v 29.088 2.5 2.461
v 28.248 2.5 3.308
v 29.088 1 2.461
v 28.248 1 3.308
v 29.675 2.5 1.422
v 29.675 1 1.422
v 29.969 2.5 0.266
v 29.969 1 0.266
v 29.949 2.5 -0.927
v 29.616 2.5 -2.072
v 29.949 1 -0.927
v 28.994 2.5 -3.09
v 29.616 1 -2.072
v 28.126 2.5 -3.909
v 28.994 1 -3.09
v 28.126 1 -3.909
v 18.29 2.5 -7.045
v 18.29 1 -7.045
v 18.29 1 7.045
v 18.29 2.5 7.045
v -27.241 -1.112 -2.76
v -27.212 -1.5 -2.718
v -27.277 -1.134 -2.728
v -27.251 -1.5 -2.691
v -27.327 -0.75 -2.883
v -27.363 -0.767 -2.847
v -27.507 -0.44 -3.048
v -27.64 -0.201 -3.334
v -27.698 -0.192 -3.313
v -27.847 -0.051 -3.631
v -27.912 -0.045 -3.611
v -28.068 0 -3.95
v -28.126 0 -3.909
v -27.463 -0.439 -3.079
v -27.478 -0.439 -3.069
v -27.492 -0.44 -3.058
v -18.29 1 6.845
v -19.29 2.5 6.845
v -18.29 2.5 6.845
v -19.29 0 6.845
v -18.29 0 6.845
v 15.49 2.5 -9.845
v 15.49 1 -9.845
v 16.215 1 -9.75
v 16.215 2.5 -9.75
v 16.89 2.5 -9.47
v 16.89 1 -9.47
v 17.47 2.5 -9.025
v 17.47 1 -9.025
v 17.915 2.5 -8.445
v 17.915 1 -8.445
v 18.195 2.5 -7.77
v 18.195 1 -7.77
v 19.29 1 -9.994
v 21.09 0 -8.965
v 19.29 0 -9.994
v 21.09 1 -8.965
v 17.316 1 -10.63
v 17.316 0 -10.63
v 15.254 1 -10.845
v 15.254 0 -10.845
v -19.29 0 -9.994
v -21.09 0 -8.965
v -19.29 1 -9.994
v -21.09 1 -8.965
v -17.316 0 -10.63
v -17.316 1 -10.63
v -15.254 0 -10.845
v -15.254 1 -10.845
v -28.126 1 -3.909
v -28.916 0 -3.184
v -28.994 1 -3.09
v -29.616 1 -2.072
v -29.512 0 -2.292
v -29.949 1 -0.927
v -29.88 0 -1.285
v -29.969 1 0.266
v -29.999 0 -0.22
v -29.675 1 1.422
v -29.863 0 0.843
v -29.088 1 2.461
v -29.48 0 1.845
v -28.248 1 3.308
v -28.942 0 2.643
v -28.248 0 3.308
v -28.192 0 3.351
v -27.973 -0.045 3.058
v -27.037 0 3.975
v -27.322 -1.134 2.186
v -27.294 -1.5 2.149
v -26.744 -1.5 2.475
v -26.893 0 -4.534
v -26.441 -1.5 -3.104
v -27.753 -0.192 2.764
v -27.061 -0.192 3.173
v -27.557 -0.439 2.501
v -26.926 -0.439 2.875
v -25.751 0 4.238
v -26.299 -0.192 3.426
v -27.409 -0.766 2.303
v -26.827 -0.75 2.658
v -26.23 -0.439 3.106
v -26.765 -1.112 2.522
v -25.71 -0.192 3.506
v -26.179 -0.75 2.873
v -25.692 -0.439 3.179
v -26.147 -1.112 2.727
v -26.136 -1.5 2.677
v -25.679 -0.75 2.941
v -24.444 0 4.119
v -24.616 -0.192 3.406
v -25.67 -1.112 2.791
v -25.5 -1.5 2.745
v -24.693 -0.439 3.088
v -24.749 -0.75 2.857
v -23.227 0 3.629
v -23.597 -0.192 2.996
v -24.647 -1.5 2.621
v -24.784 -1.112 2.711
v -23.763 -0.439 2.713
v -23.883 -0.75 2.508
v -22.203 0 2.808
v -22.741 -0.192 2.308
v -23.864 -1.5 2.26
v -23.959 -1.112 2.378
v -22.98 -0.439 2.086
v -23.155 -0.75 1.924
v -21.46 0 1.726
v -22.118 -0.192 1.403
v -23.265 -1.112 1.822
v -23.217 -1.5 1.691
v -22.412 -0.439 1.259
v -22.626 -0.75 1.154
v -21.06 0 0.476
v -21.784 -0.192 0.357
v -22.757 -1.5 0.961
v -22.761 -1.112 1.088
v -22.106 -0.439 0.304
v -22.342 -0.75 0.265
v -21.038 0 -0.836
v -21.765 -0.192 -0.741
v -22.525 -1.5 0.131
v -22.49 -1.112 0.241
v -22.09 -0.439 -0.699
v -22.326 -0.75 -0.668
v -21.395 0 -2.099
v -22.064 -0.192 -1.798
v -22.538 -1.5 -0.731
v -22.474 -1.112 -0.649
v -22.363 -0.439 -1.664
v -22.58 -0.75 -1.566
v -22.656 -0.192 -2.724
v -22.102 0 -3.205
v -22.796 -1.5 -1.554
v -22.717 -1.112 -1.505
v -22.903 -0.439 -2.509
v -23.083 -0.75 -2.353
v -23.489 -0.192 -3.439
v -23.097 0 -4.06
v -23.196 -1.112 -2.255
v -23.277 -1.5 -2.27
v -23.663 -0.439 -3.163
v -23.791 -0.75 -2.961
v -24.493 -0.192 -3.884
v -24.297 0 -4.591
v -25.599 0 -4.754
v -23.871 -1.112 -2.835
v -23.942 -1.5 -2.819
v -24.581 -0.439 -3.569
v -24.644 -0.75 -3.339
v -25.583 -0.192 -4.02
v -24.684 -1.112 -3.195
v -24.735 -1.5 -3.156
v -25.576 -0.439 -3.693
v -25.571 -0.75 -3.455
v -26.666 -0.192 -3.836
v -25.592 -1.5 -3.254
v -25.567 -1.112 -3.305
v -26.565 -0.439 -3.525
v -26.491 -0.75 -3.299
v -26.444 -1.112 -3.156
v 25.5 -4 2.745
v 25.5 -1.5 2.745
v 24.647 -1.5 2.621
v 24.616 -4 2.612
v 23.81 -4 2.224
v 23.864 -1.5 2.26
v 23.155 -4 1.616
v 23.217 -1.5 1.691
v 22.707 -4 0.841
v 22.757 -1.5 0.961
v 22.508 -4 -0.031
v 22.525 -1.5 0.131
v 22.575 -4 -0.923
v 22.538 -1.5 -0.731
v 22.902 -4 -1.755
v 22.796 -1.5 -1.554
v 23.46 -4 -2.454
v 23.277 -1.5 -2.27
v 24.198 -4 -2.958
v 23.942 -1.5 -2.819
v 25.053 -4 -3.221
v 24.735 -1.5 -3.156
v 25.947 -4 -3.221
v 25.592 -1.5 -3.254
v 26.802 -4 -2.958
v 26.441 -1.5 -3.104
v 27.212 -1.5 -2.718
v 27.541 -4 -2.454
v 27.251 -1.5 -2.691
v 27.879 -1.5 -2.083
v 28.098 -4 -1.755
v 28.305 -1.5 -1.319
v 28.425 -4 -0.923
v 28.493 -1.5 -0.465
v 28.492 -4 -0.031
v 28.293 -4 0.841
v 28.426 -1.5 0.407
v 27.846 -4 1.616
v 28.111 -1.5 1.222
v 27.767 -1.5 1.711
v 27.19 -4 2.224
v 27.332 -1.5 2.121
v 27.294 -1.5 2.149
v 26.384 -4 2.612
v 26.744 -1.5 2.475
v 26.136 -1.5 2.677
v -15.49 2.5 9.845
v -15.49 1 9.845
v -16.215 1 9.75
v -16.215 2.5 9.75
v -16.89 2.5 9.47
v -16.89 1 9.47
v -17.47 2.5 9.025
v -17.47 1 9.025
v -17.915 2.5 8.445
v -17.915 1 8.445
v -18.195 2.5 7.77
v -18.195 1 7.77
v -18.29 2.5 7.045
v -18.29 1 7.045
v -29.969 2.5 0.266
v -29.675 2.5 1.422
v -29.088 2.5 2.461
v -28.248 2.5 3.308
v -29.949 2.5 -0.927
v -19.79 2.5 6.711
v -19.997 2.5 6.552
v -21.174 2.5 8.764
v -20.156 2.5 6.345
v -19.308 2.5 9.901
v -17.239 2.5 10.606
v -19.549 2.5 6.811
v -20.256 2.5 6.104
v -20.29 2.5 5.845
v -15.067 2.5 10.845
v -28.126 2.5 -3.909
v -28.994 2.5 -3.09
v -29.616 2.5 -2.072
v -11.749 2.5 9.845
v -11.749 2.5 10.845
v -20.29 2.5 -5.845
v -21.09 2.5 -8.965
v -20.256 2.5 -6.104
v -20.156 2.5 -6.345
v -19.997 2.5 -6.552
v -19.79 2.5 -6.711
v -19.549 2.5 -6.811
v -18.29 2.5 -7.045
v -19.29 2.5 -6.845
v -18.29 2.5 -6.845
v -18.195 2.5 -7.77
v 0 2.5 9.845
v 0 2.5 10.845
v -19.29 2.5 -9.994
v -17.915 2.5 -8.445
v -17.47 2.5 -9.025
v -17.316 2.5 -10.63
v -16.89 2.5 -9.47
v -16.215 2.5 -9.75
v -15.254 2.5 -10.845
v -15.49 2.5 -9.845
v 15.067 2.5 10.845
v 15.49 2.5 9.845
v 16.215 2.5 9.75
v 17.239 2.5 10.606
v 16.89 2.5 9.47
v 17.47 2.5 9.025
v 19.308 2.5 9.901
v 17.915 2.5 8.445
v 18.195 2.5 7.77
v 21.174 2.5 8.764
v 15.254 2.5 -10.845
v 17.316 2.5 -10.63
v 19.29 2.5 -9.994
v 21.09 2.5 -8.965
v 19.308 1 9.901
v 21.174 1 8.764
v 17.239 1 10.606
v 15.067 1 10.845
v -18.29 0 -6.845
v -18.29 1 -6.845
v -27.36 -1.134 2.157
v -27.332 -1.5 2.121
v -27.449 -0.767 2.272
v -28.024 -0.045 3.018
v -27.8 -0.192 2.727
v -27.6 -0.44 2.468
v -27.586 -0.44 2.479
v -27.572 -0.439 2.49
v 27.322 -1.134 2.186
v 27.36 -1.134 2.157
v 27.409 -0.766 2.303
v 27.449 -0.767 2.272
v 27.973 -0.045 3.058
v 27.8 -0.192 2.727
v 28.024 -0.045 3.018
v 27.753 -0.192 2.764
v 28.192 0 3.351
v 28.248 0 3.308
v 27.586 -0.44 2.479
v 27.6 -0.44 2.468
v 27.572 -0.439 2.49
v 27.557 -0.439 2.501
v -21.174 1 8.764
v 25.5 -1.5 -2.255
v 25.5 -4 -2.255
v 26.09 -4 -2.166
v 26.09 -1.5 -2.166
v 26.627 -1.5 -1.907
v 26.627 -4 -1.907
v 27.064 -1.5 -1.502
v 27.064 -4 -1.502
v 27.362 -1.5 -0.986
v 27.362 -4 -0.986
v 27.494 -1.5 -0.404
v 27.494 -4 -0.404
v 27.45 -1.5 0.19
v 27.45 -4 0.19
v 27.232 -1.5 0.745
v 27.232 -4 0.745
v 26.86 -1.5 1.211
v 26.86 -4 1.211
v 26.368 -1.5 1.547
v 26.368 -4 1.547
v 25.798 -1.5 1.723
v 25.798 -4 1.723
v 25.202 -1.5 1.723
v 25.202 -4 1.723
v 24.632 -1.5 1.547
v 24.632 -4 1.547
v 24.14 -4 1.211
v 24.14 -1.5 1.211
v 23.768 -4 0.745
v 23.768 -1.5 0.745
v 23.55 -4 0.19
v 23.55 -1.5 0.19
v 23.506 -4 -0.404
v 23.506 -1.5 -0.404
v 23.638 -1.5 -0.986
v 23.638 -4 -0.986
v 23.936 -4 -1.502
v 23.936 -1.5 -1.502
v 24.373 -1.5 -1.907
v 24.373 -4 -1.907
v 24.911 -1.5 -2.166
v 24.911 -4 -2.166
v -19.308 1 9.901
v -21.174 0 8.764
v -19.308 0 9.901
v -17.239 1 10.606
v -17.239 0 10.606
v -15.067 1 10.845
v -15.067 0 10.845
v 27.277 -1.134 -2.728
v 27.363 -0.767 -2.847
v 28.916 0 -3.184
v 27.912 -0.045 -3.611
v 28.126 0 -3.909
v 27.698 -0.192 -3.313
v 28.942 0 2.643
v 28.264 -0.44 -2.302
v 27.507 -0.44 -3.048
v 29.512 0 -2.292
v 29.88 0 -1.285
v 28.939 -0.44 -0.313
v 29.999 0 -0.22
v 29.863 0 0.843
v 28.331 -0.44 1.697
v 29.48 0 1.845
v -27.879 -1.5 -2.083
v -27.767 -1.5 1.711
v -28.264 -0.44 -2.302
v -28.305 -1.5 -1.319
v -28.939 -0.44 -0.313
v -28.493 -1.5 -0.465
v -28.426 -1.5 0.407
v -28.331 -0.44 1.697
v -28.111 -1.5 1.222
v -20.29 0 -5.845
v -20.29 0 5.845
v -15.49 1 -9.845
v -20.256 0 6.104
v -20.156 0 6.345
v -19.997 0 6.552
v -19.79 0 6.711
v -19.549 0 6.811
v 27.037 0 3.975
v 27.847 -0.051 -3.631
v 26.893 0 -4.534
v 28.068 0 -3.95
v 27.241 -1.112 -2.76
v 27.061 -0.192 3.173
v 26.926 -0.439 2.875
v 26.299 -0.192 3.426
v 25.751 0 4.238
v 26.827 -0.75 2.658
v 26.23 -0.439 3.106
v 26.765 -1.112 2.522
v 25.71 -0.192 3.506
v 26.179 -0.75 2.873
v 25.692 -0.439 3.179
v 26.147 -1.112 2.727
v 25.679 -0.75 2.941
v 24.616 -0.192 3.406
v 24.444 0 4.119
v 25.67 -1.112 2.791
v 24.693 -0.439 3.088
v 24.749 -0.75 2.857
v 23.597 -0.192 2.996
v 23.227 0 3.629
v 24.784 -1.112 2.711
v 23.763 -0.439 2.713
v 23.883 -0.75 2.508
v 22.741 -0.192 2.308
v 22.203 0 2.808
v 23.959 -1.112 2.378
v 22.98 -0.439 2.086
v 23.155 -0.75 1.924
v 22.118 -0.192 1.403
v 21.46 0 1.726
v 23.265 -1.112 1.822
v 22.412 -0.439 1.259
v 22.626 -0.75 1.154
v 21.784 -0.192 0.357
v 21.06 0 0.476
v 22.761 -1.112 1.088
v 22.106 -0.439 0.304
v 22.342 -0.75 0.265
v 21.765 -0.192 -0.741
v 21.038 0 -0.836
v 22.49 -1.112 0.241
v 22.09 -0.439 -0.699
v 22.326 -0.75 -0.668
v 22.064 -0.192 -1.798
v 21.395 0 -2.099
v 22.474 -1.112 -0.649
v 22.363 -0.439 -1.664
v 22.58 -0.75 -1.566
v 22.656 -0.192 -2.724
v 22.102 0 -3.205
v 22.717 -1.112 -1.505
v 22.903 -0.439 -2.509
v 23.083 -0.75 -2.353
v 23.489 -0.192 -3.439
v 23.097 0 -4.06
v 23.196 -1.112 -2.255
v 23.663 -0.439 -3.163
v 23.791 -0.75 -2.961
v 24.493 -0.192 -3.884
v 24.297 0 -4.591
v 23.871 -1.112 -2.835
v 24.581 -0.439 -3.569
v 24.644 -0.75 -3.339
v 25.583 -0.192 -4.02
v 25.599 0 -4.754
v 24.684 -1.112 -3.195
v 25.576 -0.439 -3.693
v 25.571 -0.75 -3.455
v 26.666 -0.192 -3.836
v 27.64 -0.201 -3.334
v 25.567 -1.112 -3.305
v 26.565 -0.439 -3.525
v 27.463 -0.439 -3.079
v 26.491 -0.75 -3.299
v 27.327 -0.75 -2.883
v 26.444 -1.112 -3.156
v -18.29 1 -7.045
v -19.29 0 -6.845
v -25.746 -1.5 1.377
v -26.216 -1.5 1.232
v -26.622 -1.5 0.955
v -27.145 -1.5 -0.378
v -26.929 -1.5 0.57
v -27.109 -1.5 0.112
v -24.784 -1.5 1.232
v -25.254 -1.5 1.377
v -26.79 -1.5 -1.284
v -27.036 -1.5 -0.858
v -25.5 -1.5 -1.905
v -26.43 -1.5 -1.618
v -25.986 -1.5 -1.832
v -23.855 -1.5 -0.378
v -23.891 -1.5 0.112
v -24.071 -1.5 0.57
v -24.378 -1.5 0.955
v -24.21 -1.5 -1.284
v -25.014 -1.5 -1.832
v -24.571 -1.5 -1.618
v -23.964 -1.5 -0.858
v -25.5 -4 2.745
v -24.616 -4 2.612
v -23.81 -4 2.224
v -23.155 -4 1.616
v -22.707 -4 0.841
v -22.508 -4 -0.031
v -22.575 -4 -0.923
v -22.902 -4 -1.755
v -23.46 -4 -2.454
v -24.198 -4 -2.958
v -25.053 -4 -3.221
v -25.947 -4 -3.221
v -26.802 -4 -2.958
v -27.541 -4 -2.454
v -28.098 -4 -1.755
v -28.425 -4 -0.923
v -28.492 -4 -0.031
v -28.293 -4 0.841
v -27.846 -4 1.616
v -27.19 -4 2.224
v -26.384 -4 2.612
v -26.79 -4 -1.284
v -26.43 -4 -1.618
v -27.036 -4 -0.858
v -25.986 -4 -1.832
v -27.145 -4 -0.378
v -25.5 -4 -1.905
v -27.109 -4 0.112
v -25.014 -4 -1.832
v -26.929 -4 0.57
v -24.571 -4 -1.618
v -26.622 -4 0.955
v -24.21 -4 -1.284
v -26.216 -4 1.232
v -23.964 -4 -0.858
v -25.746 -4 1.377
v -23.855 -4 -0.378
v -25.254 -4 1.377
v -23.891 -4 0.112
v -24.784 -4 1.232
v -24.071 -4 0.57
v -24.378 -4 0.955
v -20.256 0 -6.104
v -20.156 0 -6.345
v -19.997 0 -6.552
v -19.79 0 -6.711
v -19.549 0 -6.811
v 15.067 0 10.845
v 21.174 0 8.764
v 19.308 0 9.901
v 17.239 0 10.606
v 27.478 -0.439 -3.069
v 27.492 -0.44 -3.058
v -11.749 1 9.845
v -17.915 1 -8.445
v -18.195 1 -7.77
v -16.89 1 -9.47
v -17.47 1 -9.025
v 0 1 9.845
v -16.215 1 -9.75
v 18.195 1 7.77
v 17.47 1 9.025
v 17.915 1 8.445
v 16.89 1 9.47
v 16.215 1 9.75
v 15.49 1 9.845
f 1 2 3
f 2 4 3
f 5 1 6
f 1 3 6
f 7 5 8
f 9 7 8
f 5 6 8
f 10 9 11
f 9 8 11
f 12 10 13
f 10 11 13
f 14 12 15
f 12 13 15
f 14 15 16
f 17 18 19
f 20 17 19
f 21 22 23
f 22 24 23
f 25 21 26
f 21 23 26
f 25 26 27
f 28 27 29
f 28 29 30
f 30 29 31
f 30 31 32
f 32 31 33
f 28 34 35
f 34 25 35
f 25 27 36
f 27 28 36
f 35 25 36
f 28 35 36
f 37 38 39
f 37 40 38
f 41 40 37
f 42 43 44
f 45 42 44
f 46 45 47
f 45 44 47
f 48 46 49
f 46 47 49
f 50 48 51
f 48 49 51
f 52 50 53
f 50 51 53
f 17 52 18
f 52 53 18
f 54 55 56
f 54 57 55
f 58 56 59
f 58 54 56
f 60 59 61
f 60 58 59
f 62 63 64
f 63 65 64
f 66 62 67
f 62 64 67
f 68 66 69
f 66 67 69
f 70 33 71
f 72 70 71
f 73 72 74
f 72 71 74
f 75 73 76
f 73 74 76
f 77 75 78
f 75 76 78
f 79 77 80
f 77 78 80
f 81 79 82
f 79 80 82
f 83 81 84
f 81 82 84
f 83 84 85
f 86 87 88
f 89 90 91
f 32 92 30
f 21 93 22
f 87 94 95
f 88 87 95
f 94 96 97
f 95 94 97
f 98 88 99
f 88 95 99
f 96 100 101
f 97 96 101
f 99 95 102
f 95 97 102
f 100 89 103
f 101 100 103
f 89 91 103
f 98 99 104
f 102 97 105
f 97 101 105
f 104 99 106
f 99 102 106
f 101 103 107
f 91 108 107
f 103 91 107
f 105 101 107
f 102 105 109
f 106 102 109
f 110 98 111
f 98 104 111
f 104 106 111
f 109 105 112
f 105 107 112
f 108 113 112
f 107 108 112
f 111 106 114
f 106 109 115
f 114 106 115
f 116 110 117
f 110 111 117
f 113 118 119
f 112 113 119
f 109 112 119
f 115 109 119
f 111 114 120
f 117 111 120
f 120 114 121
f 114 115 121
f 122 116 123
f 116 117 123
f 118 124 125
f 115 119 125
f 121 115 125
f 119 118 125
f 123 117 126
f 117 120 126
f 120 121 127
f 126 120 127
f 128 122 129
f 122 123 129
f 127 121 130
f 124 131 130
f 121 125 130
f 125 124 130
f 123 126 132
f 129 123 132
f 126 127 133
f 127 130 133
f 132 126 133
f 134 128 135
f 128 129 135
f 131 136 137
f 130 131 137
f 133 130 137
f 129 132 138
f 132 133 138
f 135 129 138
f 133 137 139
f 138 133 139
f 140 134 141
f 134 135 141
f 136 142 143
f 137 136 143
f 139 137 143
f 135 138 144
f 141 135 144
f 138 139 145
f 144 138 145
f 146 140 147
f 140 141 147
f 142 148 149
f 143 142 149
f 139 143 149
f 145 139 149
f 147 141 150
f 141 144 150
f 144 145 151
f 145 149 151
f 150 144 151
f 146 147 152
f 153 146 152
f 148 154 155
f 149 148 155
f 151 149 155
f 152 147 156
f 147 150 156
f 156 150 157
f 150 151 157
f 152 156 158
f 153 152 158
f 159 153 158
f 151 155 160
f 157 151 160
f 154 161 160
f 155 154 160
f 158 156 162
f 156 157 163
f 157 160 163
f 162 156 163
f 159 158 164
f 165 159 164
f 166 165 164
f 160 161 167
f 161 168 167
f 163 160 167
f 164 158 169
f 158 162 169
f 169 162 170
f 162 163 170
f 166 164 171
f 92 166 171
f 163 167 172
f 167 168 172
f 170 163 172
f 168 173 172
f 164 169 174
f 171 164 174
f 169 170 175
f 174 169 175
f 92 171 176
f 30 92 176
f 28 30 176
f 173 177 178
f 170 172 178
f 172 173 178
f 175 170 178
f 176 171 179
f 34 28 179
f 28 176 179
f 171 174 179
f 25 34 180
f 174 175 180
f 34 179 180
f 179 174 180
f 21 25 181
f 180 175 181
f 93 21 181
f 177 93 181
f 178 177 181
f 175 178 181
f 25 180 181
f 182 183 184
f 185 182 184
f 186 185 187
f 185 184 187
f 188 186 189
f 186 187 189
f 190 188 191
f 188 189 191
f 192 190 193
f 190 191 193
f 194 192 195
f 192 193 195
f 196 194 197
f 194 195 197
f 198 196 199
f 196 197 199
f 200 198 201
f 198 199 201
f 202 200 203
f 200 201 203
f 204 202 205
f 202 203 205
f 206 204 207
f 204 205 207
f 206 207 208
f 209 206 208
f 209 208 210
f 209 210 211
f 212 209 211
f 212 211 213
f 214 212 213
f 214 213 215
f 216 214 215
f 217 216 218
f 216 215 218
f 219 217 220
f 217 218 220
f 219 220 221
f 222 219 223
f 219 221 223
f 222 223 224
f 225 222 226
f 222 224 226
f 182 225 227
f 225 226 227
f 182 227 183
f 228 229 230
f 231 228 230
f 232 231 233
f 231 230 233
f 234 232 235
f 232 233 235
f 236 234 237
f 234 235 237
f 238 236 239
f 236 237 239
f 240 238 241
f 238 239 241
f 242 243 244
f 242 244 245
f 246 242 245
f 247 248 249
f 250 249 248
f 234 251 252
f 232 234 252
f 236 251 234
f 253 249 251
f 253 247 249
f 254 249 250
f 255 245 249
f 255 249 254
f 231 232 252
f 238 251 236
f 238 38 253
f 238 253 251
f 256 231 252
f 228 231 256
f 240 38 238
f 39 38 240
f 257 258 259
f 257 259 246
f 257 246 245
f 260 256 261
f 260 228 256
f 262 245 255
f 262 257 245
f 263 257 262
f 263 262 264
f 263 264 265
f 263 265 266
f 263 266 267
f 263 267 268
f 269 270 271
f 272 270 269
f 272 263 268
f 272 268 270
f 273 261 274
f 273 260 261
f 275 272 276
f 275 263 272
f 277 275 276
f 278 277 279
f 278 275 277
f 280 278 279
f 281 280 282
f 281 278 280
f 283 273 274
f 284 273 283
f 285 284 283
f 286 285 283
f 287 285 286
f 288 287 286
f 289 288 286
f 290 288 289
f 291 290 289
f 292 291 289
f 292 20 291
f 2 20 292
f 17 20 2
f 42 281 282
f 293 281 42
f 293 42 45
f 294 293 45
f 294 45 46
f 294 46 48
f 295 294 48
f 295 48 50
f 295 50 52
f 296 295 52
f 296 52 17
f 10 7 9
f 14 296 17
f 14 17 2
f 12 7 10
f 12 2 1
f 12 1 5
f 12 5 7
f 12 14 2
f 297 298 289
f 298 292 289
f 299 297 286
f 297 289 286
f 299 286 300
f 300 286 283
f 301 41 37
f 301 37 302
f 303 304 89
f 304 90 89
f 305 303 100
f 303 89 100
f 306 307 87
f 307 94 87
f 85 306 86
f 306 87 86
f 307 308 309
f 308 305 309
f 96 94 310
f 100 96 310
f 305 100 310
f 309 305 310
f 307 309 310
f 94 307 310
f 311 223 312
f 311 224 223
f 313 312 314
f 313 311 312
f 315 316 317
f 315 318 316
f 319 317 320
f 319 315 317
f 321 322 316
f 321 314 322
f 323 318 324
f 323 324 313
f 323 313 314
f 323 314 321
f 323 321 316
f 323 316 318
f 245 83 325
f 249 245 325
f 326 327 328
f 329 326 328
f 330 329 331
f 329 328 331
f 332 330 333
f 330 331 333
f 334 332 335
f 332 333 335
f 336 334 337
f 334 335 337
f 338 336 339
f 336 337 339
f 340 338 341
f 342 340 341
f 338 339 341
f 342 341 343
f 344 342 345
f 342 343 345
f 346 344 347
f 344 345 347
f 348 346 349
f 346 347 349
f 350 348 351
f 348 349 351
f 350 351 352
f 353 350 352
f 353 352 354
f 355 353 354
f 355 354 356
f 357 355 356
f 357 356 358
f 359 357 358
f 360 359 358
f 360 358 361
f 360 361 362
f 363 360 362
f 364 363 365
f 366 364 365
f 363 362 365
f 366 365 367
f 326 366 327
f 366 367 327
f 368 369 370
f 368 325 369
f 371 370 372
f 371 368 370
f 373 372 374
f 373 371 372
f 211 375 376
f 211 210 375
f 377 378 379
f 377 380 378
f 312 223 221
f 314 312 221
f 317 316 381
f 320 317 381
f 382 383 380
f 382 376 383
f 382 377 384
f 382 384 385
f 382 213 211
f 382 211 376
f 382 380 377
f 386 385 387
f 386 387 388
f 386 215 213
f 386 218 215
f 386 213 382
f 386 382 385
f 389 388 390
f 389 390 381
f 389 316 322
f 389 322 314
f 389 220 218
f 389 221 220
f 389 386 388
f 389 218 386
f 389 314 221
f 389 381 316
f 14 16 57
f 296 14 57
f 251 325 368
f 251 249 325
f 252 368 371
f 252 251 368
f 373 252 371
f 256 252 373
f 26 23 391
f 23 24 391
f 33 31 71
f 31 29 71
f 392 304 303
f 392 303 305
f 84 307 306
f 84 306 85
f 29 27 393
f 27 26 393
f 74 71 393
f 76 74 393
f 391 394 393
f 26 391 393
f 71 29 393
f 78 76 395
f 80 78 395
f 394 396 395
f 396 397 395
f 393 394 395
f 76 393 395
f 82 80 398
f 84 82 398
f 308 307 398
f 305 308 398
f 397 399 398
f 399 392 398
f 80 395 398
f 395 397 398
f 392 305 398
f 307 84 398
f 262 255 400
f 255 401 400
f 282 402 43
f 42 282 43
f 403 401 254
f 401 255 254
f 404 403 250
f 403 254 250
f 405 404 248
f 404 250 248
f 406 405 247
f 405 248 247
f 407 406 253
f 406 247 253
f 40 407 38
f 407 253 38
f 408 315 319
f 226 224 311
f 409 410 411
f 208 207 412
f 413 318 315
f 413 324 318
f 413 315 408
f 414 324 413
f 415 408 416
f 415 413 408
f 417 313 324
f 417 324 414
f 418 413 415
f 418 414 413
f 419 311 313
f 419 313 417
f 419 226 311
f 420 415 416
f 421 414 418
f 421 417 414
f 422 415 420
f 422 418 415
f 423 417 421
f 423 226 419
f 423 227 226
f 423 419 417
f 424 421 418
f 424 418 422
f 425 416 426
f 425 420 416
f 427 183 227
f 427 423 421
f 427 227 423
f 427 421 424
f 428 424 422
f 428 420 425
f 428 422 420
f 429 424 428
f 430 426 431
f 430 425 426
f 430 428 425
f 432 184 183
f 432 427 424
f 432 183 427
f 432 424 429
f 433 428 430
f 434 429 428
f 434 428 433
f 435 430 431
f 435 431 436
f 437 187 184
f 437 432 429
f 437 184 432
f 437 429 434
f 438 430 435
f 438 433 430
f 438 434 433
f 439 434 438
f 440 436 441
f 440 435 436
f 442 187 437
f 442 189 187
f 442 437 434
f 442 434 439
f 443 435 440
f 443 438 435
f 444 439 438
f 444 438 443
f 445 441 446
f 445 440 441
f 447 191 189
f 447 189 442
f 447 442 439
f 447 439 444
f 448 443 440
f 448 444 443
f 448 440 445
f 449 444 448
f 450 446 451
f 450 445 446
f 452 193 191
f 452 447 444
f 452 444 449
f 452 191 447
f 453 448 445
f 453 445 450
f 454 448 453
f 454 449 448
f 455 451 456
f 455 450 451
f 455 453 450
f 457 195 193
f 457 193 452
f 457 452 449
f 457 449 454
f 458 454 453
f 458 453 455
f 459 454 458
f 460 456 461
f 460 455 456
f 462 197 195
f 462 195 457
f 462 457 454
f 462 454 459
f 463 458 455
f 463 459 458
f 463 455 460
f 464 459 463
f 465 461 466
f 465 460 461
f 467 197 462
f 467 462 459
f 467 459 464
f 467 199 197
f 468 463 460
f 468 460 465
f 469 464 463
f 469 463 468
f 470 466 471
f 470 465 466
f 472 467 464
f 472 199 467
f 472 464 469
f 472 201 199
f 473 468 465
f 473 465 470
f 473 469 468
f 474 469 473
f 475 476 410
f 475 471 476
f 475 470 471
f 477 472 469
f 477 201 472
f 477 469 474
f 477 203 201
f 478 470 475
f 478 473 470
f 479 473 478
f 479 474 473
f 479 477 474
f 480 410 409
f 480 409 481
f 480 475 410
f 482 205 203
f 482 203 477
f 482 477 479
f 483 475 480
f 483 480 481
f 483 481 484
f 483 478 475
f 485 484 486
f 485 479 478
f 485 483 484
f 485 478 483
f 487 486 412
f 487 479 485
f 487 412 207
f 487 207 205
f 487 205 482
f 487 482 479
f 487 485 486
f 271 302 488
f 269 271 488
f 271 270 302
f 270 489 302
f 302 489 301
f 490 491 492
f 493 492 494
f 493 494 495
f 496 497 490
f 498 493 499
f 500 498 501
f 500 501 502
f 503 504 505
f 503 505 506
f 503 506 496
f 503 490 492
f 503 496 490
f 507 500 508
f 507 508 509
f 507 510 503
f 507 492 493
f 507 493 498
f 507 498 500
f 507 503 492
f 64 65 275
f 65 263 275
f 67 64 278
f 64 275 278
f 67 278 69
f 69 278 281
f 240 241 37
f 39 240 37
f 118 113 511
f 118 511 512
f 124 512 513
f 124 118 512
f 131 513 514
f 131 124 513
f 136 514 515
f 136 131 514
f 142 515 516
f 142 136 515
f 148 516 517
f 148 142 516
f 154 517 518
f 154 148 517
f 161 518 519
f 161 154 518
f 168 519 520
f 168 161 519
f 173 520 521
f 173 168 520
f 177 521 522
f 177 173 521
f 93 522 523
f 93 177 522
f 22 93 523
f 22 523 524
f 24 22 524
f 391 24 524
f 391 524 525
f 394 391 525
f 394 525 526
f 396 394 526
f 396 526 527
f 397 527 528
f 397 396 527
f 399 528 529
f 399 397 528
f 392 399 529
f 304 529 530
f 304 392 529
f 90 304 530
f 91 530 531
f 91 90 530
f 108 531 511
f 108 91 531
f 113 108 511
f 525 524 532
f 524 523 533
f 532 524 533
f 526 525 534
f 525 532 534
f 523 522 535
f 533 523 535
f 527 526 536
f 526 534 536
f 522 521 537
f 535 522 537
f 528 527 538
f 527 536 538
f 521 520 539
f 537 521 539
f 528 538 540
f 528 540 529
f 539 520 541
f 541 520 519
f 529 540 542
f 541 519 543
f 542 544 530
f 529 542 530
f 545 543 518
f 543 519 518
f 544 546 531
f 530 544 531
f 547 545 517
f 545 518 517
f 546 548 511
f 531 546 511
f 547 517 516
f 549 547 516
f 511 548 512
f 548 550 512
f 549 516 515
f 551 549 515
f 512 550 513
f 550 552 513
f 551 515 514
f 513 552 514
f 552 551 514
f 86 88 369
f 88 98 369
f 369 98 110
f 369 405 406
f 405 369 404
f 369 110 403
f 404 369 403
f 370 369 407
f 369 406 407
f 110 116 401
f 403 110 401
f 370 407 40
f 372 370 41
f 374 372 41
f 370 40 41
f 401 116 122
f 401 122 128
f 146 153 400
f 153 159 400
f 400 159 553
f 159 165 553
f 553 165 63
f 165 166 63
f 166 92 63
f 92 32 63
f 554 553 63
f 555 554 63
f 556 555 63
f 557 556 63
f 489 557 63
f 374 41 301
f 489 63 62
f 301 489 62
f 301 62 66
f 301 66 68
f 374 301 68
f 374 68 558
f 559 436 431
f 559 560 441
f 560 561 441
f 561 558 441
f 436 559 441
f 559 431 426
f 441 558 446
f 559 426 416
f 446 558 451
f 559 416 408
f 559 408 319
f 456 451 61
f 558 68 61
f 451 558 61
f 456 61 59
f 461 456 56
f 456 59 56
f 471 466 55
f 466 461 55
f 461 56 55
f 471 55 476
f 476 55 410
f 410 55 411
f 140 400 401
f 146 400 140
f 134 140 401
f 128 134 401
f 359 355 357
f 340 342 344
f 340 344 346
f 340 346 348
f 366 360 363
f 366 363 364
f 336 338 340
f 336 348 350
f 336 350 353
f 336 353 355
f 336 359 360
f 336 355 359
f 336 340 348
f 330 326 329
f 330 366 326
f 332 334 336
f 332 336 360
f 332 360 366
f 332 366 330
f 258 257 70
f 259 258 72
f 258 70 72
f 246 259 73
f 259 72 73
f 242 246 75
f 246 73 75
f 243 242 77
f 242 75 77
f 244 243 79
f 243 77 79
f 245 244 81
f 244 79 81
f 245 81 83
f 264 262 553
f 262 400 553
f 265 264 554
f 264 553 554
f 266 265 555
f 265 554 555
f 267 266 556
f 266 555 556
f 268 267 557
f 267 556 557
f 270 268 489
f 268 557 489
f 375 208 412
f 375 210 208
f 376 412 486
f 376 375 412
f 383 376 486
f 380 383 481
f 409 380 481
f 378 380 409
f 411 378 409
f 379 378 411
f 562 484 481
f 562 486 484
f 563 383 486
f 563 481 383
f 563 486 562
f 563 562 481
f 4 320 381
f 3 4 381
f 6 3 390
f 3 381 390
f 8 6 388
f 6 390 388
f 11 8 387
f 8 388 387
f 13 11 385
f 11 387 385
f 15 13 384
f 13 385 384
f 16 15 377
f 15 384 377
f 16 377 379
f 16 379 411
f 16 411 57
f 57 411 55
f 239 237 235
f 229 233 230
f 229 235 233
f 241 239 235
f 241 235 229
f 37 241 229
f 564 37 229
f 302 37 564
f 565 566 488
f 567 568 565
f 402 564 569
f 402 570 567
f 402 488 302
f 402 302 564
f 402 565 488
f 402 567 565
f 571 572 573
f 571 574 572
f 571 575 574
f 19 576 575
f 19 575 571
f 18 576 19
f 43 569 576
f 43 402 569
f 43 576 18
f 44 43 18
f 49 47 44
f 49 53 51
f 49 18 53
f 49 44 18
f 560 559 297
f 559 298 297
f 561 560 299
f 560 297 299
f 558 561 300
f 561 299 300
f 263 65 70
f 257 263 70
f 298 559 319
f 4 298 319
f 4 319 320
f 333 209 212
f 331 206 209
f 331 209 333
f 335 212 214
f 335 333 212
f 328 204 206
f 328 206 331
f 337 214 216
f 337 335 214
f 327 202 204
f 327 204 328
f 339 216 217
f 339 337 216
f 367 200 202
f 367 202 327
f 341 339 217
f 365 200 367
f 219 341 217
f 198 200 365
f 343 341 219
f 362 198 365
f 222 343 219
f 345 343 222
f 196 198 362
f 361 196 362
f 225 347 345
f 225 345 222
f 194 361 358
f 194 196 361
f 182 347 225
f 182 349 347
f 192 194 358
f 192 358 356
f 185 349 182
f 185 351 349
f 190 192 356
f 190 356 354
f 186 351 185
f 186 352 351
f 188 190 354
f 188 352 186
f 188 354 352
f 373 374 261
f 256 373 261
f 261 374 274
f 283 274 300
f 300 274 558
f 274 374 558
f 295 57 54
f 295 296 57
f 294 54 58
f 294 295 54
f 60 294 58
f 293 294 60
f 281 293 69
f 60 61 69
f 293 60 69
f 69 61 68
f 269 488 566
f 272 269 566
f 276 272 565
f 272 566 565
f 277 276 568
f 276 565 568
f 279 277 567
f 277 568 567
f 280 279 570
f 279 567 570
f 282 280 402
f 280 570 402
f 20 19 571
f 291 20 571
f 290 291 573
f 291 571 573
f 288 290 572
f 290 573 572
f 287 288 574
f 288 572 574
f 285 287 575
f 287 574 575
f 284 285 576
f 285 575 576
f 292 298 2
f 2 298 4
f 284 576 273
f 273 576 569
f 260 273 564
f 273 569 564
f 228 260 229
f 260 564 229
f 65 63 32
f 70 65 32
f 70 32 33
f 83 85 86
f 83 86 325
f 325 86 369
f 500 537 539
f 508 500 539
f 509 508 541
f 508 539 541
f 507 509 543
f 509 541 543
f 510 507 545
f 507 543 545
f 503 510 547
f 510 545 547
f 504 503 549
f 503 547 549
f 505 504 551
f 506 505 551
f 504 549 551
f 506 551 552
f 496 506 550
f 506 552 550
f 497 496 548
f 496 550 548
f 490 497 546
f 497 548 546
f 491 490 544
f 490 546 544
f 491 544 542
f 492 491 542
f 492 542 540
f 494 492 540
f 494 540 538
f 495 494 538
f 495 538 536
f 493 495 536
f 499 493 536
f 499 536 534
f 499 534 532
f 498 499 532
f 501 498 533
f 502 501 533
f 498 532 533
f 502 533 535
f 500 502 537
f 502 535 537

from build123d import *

# Parameters (mm, degrees)
SKETCH_1_W          = 2
SKETCH_1_H          = 13.69
EXTRUDE_1_DEPTH     = 1
EXTRUDE_START       = 1
SKETCH_1_3_R        = 4.499438526
SKETCH_1_3_R_2      = 3
SKETCH_1_3_W        = 4.417890806
SKETCH_1_3_H        = 1
SKETCH_1_3_W_2      = 11.749439362
SKETCH_1_3_H_2      = 0.999974731
EXTRUDE_2_DEPTH     = 1.5
FILLET_1_R          = 1
SKETCH_1_4_R        = 3
EXTRUDE_3_DEPTH     = 4
SKETCH_4_R          = 1.65
CUT_EXTRUDE_1_DEPTH = 2.5
FILLET_2_R          = 1.5
FILLET_3_R          = 10
SKETCH_9_R          = 3
EXTRUDE_6_DEPTH     = 4
SKETCH_10_R         = 2
CUT_EXTRUDE_3_DEPTH = 2.5
FILLET_5_R          = 1.5


with BuildPart() as part:
    # 草图1 → 凸台-拉伸1 (new body)
    with BuildSketch(Plane(origin=(0, 0, 0), x_dir=(1, 0, 0), z_dir=(0, 1, 0))):
        with BuildLine():
            Line((18.474806794, -10.844974731), (28.247830948, -3.308032201))
            ThreePointArc((28.247830948, -3.308032201), (29.998869582, 0.33088638), (28.126002395, 3.908627739))
            Line((28.126002395, 3.908627739), (18.474816537, 10.845))
            Line((18.474816537, 10.845), (-18.474816537, 10.845))
            Line((-18.474816537, 10.845), (-28.126002395, 3.908627739))
            ThreePointArc((-28.126002395, 3.908627739), (-29.998869582, 0.330886398), (-28.247830977, -3.308032179))
            Line((-28.247830977, -3.308032179), (-18.474806794, -10.844974731))
            Line((-18.474806794, -10.844974731), (18.474806794, -10.844974731))
        make_face()
        with Locations((-19.29, 0)):
            Rectangle(SKETCH_1_W, SKETCH_1_H, mode=Mode.SUBTRACT)
    extrude(amount=EXTRUDE_1_DEPTH)

    # 草图1<3> → 凸台-拉伸2 (add)
    # profile 1 of 10: a face of its own
    with BuildSketch(Plane(origin=(0, 0, 0), x_dir=(1, 0, 0), z_dir=(0, 1, 0)).offset(EXTRUDE_START)):
        with Locations((-25.50007206, 0.254939612)):
            Circle(SKETCH_1_3_R)
        with Locations((-25.50007206, 0.254939612)):
            Circle(SKETCH_1_3_R_2, mode=Mode.SUBTRACT)
    # profile 2 of 10: a face of its own
    with BuildSketch(Plane(origin=(0, 0, 0), x_dir=(1, 0, 0), z_dir=(0, 1, 0)).offset(EXTRUDE_START)):
        with Locations((-25.50007206, 0.254939612)):
            Circle(SKETCH_1_3_R_2)
    # profile 3 of 10: a face of its own
    with BuildSketch(Plane(origin=(0, 0, 0), x_dir=(1, 0, 0), z_dir=(0, 1, 0)).offset(EXTRUDE_START)):
        with BuildLine():
            Line((-19.79, 6.845), (-19.79, 9.89976879))
            Line((-19.79, 9.89976879), (-28.126002395, 3.908627739))
            ThreePointArc((-28.126002395, 3.908627739), (-23.44705782, 4.258697795), (-21.000633534, 0.254939612))
            ThreePointArc((-21.000633534, 0.254939612), (-23.514930413, -3.782901357), (-28.247830977, -3.308032179))
            Line((-28.247830977, -3.308032179), (-19.79, -9.830699574))
            Line((-19.79, -9.830699574), (-19.79, -6.845))
            Line((-19.79, -6.845), (-20.29, -6.845))
            Line((-20.29, -6.845), (-20.29, 6.845))
            Line((-20.29, 6.845), (-19.79, 6.845))
        make_face()
    # profile 4 of 10: a face of its own
    with BuildSketch(Plane(origin=(0, 0, 0), x_dir=(1, 0, 0), z_dir=(0, 1, 0)).offset(EXTRUDE_START)):
        with BuildLine():
            Line((-18.474816537, 10.845), (-19.79, 9.89976879))
            Line((-19.79, 9.89976879), (-19.79, 6.845))
            Line((-19.79, 6.845), (-18.29, 6.845))
            Line((-18.29, 6.845), (-18.29, 7.045))
            ThreePointArc((-18.29, 7.045), (-17.469898987, 9.024898987), (-15.49, 9.845))
            Line((-15.49, 9.845), (-4.417890806, 9.845))
            Line((-4.417890806, 9.845), (-4.417890806, 10.845))
            Line((-4.417890806, 10.845), (-18.474816537, 10.845))
        make_face()
    # profile 5 of 10: a face of its own
    with BuildSketch(Plane(origin=(0, 0, 0), x_dir=(1, 0, 0), z_dir=(0, 1, 0)).offset(EXTRUDE_START)):
        with Locations((-2.208945403, 10.345)):
            Rectangle(SKETCH_1_3_W, SKETCH_1_3_H)
    # profile 6 of 10: a face of its own
    with BuildSketch(Plane(origin=(0, 0, 0), x_dir=(1, 0, 0), z_dir=(0, 1, 0)).offset(EXTRUDE_START)):
        with BuildLine():
            Line((-19.79, -6.845), (-19.79, -9.830699574))
            Line((-19.79, -9.830699574), (-18.474806794, -10.844974731))
            Line((-18.474806794, -10.844974731), (-11.749439362, -10.844974731))
            Line((-11.749439362, -10.844974731), (-11.749439362, -9.845))
            Line((-11.749439362, -9.845), (-15.49, -9.845))
            ThreePointArc((-15.49, -9.845), (-17.469898987, -9.024898987), (-18.29, -7.045))
            Line((-18.29, -7.045), (-18.29, -6.845))
            Line((-18.29, -6.845), (-19.79, -6.845))
        make_face()
    # profile 7 of 10: a face of its own
    with BuildSketch(Plane(origin=(0, 0, 0), x_dir=(1, 0, 0), z_dir=(0, 1, 0)).offset(EXTRUDE_START)):
        with Locations((-5.874719681, -10.344987365)):
            Rectangle(SKETCH_1_3_W_2, SKETCH_1_3_H_2)
    # profile 8 of 10: a face of its own
    with BuildSketch(Plane(origin=(0, 0, 0), x_dir=(1, 0, 0), z_dir=(0, 1, 0)).offset(EXTRUDE_START)):
        with BuildLine():
            Line((18.474816537, 10.845), (0, 10.845))
            Line((0, 10.845), (0, 9.845))
            Line((0, 9.845), (15.49, 9.845))
            ThreePointArc((15.49, 9.845), (17.469898987, 9.024898987), (18.29, 7.045))
            Line((18.29, 7.045), (18.29, -7.045))
            ThreePointArc((18.29, -7.045), (17.469898987, -9.024898987), (15.49, -9.845))
            Line((15.49, -9.845), (0, -9.845))
            Line((0, -9.845), (0, -10.844974731))
            Line((0, -10.844974731), (18.474806794, -10.844974731))
            Line((18.474806794, -10.844974731), (19.79, -9.830699574))
            Line((19.79, -9.830699574), (19.79, 9.89976879))
            Line((19.79, 9.89976879), (18.474816537, 10.845))
        make_face()
    # profile 9 of 10: a face of its own
    with BuildSketch(Plane(origin=(0, 0, 0), x_dir=(1, 0, 0), z_dir=(0, 1, 0)).offset(EXTRUDE_START)):
        with BuildLine():
            Line((28.126002395, 3.908627739), (19.79, 9.89976879))
            Line((19.79, 9.89976879), (19.79, -9.830699574))
            Line((19.79, -9.830699574), (28.247830948, -3.308032201))
            ThreePointArc((28.247830948, -3.308032201), (21.001274538, 0.178992845), (28.126002395, 3.908627739))
        make_face()
    # profile 10 of 10: a face of its own
    with BuildSketch(Plane(origin=(0, 0, 0), x_dir=(1, 0, 0), z_dir=(0, 1, 0)).offset(EXTRUDE_START)):
        with Locations((25.50007206, 0.254939612)):
            Circle(SKETCH_1_3_R)
    extrude(amount=EXTRUDE_2_DEPTH)

    # 圆角1
    fillet_1_edges = [part.edges().sort_by_distance(p)[0] for p in [
        (-20.29, 1.25, -6.845),
        (-20.29, 1.25, 6.845),
    ]]
    fillet(fillet_1_edges, radius=FILLET_1_R)

    # 草图1<4> → 凸台-拉伸3 (add)
    with BuildSketch(Plane(origin=(0, 0, 0), x_dir=(1, 0, 0), z_dir=(0, 1, 0))):
        with Locations(Location((-25.50007206, 0.254939612, 0), (0, 0, 270))):
            Circle(SKETCH_1_4_R)
    extrude(amount=-EXTRUDE_3_DEPTH)

    # 草图4 → 切除-拉伸1 (cut)
    with BuildSketch(Plane.XZ.offset(4)):
        with Locations(Location((-25.50007206, -0.254939612, 0), (0, 0, 270))):
            Circle(SKETCH_4_R)
        with Locations((25.5, -0.255)):
            Circle(SKETCH_4_R)
    extrude(amount=-CUT_EXTRUDE_1_DEPTH, mode=Mode.SUBTRACT)

    # 圆角2
    fillet_2_edges = [part.edges().sort_by_distance(p)[0] for p in [
        (-25.50007206, 0, -3.254939612),
    ]]
    fillet(fillet_2_edges, radius=FILLET_2_R)

    # 圆角3
    fillet_3_edges = [part.edges().sort_by_distance(p)[0] for p in [
        (-18.474806794, 1.25, 10.844974731),
        (-18.474816537, 1.25, -10.845),
        (18.474816537, 1.25, -10.845),
        (18.474806794, 1.25, 10.844974731),
    ]]
    fillet(fillet_3_edges, radius=FILLET_3_R)

    # 草图9 → 凸台-拉伸6 (add)
    with BuildSketch(Plane.XZ):
        with Locations(Location((25.50007206, -0.254939612, 0), (0, 0, 90))):
            Circle(SKETCH_9_R)
    extrude(amount=EXTRUDE_6_DEPTH)

    # 草图10 → 切除-拉伸3 (cut)
    with BuildSketch(Plane.XZ.offset(4)):
        with Locations(Location((25.50007206, -0.254939612, 0), (0, 0, 270))):
            Circle(SKETCH_10_R)
    extrude(amount=-CUT_EXTRUDE_3_DEPTH, mode=Mode.SUBTRACT)

    # 圆角5
    fillet_5_edges = [part.edges().sort_by_distance(p)[0] for p in [
        (25.50007206, 0, -3.254939612),
    ]]
    fillet(fillet_5_edges, radius=FILLET_5_R)


solid = part.part
